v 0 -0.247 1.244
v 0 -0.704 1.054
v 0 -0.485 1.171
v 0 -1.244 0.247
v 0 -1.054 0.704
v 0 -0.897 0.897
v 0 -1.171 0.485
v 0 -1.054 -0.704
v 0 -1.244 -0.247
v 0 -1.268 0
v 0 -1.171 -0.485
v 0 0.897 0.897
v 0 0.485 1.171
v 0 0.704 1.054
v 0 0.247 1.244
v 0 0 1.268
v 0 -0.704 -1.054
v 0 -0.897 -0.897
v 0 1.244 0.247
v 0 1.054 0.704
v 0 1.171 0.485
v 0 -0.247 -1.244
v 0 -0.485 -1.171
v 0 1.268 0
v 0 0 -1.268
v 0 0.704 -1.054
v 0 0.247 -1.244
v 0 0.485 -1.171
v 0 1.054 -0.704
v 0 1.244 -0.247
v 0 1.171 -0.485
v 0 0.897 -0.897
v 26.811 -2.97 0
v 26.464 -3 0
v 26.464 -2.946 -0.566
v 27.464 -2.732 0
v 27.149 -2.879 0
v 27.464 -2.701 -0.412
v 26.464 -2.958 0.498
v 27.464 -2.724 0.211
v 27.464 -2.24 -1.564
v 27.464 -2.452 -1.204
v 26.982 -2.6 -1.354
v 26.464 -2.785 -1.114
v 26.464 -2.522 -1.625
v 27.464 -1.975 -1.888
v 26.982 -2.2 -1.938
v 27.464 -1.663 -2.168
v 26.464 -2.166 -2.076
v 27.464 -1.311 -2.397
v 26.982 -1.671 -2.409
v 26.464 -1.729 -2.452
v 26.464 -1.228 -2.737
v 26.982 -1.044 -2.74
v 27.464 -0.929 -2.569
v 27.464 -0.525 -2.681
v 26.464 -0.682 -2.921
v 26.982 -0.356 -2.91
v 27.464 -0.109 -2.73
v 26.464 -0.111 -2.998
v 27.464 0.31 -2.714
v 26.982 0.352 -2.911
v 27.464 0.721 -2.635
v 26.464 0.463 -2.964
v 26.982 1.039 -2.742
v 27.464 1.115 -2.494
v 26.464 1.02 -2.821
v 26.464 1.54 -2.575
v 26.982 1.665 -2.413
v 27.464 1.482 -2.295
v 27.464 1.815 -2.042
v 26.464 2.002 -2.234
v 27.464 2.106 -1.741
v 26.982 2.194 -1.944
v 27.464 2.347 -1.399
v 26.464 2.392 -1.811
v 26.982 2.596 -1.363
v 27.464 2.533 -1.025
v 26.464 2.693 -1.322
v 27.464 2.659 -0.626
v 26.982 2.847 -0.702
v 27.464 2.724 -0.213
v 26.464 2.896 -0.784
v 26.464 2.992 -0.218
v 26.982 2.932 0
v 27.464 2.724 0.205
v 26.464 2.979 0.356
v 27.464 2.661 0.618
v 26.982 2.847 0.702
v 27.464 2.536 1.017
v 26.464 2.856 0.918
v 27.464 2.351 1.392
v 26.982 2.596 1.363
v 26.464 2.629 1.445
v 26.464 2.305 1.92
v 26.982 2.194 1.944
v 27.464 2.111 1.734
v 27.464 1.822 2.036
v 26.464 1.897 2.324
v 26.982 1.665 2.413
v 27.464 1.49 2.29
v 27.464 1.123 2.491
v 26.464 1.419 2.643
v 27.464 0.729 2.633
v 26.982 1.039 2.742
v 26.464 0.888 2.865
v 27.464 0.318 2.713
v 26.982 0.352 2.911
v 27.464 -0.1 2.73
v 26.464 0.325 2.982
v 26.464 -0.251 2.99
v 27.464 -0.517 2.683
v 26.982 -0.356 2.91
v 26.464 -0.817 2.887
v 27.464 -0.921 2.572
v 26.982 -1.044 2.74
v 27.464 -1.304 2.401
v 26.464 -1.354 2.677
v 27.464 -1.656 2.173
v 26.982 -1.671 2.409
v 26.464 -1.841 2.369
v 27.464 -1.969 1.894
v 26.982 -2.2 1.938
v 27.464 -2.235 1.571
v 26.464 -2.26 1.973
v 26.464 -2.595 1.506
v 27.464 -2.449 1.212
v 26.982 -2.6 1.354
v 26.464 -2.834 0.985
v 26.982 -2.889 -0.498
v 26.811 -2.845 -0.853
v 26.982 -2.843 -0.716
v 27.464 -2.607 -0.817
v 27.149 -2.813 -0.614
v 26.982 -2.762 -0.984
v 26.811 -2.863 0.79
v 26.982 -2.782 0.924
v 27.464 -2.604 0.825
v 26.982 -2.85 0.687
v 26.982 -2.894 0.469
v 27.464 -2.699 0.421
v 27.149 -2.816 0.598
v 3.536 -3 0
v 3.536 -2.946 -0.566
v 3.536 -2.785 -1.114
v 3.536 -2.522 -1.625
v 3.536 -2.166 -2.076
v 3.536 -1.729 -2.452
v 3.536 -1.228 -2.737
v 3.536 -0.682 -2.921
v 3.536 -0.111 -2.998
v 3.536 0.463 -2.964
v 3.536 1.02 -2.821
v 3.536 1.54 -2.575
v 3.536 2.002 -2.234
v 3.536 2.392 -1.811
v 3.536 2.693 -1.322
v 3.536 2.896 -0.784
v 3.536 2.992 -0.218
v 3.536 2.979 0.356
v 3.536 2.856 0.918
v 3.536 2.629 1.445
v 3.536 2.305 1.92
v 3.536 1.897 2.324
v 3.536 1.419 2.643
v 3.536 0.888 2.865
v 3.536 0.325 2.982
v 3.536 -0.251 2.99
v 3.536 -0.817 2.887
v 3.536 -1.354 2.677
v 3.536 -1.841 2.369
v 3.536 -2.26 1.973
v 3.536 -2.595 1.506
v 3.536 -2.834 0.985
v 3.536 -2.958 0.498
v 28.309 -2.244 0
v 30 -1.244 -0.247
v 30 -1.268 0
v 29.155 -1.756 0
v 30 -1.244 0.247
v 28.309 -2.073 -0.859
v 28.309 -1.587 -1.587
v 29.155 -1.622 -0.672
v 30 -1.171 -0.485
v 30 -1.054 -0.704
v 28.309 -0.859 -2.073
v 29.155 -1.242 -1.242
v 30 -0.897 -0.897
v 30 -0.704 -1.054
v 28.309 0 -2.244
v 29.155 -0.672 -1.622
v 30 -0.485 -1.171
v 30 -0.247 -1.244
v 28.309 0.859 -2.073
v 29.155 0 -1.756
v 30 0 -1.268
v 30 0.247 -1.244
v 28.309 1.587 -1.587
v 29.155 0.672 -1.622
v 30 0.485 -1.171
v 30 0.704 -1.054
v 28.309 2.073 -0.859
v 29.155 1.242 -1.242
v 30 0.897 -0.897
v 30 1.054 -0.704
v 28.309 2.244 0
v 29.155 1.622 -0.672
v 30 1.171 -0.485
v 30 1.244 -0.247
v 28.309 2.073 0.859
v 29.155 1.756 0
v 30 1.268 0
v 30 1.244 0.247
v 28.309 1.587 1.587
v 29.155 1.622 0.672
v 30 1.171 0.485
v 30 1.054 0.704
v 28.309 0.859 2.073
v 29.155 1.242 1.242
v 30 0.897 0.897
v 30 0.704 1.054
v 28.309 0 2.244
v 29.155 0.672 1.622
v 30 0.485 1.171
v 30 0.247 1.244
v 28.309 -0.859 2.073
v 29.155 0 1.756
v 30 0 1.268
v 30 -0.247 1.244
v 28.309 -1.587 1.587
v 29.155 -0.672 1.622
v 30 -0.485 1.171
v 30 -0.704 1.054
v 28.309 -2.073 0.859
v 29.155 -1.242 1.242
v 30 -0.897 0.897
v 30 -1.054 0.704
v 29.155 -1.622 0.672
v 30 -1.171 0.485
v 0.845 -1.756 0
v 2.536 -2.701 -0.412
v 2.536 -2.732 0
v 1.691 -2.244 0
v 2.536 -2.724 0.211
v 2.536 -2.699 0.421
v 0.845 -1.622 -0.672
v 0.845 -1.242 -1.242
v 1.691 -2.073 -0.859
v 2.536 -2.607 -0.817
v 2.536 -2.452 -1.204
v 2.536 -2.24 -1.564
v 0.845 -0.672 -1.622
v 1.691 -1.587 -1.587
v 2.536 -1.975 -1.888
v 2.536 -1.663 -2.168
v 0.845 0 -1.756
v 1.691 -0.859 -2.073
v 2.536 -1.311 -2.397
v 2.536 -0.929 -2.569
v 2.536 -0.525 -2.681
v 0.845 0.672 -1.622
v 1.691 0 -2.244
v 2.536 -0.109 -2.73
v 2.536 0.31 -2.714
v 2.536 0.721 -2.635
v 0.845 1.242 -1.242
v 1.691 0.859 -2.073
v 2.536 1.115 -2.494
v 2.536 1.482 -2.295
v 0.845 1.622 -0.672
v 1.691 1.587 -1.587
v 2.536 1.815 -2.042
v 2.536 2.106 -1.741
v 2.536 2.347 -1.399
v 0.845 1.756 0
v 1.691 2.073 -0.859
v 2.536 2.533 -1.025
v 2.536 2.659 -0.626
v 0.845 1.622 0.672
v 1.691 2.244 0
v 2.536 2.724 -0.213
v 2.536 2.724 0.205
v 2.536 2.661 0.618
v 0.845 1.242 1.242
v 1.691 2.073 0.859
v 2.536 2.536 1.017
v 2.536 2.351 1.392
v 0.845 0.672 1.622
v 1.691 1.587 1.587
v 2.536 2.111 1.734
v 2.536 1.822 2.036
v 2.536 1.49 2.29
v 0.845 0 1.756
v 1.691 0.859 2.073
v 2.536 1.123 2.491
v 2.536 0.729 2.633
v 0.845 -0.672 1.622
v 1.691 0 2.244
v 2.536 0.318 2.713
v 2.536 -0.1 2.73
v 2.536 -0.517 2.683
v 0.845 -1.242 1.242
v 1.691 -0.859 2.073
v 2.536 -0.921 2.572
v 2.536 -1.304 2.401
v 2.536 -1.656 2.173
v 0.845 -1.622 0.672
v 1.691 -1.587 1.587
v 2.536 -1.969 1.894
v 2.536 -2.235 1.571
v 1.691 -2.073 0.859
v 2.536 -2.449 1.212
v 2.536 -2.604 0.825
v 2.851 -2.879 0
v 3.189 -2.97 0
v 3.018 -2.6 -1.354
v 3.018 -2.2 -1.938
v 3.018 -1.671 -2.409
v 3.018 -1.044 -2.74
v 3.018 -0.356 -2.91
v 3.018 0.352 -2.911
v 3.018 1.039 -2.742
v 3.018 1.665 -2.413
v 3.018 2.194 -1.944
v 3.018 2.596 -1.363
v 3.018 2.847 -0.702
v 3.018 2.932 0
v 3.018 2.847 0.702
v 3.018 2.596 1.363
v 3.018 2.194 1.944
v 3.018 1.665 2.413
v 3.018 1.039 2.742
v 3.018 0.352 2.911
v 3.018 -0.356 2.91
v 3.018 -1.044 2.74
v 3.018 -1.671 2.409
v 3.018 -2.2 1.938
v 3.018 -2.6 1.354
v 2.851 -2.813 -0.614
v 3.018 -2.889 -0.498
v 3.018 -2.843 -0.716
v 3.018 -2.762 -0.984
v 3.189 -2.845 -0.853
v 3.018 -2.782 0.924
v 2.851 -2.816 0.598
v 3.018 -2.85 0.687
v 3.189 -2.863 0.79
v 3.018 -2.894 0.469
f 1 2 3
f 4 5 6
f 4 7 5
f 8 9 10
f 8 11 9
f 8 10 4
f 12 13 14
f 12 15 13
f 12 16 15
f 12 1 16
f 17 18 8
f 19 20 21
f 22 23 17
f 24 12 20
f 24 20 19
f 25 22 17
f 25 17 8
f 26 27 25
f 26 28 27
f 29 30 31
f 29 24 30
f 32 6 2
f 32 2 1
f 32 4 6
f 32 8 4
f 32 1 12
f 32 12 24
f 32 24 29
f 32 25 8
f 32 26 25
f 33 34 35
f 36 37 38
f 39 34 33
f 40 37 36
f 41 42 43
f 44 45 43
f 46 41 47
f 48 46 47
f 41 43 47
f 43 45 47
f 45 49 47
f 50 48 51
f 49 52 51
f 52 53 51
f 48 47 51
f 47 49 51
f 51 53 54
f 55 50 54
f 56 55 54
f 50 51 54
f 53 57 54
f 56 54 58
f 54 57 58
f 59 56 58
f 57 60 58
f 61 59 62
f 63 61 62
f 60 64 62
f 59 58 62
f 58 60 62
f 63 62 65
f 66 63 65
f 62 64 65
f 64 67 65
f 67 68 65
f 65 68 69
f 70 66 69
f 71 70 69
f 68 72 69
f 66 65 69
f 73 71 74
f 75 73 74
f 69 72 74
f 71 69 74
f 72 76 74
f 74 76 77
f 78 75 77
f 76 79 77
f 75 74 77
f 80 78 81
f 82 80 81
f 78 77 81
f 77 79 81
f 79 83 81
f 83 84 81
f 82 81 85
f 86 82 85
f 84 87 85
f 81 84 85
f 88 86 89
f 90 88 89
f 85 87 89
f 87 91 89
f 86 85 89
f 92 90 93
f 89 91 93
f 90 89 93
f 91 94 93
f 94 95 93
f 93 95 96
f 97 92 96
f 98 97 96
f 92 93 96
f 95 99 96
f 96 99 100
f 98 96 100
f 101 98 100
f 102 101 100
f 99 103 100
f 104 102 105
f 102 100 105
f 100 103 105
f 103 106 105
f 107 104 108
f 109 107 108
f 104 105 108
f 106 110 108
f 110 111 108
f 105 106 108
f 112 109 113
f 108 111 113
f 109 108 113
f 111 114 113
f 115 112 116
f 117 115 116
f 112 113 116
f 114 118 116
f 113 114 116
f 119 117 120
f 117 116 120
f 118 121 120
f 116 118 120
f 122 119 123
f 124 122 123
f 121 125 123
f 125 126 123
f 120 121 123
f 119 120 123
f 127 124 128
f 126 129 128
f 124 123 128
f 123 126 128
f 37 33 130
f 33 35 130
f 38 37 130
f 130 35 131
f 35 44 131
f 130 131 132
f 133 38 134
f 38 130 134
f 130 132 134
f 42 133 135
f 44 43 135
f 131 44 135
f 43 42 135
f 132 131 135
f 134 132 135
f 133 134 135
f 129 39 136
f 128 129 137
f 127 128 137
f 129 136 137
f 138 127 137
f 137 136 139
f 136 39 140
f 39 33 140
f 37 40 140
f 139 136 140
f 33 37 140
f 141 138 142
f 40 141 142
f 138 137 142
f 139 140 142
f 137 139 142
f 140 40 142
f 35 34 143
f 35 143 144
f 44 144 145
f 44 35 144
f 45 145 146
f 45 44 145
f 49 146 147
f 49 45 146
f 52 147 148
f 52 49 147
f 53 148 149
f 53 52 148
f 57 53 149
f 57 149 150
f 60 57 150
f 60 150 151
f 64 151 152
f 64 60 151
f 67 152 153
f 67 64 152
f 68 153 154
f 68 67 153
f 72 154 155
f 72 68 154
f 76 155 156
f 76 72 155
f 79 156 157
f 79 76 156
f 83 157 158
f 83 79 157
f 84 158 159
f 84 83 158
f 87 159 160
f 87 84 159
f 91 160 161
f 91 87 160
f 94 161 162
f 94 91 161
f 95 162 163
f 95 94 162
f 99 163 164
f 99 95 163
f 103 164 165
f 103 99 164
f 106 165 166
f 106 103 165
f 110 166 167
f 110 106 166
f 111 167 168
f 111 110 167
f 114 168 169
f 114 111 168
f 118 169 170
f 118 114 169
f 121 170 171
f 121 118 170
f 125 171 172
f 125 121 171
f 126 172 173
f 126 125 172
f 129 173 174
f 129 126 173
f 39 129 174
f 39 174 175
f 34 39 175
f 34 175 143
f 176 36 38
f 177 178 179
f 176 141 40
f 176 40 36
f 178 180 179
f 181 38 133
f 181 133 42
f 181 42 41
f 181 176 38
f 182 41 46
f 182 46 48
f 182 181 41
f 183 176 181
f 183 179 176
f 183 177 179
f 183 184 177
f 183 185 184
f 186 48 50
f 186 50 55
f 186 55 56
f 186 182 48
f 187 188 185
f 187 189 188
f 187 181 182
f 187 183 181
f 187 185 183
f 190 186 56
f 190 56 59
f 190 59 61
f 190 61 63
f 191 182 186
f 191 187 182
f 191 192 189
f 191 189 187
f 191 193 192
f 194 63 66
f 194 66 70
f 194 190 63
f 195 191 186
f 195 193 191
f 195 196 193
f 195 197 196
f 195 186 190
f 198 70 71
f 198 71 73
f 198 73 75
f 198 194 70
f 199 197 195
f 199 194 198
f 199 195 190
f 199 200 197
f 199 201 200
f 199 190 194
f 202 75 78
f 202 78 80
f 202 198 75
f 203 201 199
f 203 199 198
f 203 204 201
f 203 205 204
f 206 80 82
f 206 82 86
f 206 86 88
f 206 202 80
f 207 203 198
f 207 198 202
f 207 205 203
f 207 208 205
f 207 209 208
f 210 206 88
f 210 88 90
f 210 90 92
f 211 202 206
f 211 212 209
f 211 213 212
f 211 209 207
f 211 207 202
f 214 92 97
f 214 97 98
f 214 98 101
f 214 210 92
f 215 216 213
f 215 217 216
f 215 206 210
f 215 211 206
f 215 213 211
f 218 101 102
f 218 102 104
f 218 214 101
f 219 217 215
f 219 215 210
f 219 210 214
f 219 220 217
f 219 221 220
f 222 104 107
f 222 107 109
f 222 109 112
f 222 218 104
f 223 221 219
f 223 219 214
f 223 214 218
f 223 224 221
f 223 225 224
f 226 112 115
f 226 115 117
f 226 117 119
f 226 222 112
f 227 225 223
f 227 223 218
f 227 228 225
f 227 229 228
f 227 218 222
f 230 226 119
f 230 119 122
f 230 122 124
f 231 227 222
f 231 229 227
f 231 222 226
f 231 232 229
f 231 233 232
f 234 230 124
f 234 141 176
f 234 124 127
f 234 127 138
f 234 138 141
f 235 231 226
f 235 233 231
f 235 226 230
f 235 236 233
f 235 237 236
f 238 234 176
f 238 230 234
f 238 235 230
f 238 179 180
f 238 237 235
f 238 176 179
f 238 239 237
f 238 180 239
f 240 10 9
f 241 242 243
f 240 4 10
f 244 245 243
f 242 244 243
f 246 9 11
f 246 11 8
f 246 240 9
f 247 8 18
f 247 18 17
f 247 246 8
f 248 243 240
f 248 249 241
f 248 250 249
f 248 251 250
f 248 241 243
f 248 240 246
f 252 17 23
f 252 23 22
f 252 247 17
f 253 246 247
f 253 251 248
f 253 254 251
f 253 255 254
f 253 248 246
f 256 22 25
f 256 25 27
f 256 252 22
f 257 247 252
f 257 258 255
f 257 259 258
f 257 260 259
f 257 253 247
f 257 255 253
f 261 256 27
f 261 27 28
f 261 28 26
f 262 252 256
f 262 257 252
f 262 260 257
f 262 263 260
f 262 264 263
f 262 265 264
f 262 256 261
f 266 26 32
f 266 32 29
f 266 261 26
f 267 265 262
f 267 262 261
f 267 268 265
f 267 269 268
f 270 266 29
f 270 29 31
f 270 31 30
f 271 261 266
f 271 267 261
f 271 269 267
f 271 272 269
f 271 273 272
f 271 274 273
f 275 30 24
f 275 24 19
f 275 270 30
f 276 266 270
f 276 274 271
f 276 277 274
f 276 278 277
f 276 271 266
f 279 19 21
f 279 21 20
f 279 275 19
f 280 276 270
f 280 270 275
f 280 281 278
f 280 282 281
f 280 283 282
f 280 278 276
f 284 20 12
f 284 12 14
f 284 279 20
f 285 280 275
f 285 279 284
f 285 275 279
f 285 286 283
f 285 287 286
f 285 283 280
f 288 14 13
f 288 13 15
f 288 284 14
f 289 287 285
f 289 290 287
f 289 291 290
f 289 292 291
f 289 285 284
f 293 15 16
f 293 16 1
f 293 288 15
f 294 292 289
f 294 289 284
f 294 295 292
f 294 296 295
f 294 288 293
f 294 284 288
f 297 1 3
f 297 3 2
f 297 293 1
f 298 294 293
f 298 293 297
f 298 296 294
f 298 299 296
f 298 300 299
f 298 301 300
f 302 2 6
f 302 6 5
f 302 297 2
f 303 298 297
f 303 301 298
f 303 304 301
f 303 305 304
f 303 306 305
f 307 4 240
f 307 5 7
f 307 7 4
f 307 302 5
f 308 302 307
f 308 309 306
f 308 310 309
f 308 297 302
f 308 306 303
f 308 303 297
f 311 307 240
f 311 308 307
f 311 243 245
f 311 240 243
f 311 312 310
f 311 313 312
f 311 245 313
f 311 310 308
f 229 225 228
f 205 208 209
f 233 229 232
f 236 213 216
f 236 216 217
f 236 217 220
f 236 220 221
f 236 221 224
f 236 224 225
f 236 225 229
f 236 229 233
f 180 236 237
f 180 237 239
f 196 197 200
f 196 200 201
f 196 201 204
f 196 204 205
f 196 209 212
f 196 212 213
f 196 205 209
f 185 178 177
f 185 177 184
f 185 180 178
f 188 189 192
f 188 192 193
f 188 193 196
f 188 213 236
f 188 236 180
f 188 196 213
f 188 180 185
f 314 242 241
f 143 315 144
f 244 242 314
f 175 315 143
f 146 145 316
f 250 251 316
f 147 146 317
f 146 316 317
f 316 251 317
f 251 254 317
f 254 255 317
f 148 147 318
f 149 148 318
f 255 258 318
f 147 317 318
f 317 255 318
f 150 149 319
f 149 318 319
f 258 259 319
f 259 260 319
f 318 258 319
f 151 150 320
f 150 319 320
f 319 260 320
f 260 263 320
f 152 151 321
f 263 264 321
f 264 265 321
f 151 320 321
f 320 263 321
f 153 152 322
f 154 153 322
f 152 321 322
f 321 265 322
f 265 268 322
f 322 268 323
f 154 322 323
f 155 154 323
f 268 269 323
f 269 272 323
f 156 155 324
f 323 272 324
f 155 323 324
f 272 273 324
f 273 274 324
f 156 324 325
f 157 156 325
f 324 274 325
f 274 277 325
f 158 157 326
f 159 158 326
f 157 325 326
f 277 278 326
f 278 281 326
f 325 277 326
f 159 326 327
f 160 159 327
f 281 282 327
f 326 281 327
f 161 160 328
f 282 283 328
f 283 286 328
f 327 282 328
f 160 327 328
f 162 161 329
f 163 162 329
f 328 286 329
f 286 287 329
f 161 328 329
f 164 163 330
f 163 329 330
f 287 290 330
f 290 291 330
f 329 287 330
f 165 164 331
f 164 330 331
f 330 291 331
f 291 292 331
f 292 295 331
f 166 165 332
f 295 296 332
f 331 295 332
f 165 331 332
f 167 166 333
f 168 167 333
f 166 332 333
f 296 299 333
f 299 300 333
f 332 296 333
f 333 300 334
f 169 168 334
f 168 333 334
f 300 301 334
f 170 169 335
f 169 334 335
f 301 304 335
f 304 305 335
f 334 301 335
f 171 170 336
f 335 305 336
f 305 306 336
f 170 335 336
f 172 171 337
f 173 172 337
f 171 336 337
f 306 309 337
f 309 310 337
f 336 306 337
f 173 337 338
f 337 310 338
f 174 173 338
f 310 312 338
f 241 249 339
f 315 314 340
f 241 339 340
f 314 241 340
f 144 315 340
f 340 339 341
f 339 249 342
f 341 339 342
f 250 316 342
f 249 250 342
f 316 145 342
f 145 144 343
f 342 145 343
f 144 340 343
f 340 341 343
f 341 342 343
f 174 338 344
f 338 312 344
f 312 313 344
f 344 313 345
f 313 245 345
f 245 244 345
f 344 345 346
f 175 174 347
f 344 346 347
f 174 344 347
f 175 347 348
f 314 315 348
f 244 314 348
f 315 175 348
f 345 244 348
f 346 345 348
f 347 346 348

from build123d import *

# Parameters (mm, degrees)
VERRUNDUNG1_R = 2


with BuildPart() as part:
    # Skizze1 → Rotation1 (revolve)
    with BuildSketch(Plane.XY, mode=Mode.PRIVATE) as rotation1_sk:
        Polygon((0, 0), (0, 1.267949192), (3, 3), (27, 3), (30, 1.267949192), (30, 0), align=None)
    revolve(rotation1_sk.sketch.rotate(Axis((0, 0, 0), (1, 0, 0)), 180), axis=Axis((0, 0, 0), (1, 0, 0)))

    # Verrundung1
    verrundung1_edges = [part.edges().sort_by_distance(p)[0] for p in [
        (3, 3, 0),
        (27, 3, 0),
    ]]
    fillet(verrundung1_edges, radius=VERRUNDUNG1_R)


solid = part.part
